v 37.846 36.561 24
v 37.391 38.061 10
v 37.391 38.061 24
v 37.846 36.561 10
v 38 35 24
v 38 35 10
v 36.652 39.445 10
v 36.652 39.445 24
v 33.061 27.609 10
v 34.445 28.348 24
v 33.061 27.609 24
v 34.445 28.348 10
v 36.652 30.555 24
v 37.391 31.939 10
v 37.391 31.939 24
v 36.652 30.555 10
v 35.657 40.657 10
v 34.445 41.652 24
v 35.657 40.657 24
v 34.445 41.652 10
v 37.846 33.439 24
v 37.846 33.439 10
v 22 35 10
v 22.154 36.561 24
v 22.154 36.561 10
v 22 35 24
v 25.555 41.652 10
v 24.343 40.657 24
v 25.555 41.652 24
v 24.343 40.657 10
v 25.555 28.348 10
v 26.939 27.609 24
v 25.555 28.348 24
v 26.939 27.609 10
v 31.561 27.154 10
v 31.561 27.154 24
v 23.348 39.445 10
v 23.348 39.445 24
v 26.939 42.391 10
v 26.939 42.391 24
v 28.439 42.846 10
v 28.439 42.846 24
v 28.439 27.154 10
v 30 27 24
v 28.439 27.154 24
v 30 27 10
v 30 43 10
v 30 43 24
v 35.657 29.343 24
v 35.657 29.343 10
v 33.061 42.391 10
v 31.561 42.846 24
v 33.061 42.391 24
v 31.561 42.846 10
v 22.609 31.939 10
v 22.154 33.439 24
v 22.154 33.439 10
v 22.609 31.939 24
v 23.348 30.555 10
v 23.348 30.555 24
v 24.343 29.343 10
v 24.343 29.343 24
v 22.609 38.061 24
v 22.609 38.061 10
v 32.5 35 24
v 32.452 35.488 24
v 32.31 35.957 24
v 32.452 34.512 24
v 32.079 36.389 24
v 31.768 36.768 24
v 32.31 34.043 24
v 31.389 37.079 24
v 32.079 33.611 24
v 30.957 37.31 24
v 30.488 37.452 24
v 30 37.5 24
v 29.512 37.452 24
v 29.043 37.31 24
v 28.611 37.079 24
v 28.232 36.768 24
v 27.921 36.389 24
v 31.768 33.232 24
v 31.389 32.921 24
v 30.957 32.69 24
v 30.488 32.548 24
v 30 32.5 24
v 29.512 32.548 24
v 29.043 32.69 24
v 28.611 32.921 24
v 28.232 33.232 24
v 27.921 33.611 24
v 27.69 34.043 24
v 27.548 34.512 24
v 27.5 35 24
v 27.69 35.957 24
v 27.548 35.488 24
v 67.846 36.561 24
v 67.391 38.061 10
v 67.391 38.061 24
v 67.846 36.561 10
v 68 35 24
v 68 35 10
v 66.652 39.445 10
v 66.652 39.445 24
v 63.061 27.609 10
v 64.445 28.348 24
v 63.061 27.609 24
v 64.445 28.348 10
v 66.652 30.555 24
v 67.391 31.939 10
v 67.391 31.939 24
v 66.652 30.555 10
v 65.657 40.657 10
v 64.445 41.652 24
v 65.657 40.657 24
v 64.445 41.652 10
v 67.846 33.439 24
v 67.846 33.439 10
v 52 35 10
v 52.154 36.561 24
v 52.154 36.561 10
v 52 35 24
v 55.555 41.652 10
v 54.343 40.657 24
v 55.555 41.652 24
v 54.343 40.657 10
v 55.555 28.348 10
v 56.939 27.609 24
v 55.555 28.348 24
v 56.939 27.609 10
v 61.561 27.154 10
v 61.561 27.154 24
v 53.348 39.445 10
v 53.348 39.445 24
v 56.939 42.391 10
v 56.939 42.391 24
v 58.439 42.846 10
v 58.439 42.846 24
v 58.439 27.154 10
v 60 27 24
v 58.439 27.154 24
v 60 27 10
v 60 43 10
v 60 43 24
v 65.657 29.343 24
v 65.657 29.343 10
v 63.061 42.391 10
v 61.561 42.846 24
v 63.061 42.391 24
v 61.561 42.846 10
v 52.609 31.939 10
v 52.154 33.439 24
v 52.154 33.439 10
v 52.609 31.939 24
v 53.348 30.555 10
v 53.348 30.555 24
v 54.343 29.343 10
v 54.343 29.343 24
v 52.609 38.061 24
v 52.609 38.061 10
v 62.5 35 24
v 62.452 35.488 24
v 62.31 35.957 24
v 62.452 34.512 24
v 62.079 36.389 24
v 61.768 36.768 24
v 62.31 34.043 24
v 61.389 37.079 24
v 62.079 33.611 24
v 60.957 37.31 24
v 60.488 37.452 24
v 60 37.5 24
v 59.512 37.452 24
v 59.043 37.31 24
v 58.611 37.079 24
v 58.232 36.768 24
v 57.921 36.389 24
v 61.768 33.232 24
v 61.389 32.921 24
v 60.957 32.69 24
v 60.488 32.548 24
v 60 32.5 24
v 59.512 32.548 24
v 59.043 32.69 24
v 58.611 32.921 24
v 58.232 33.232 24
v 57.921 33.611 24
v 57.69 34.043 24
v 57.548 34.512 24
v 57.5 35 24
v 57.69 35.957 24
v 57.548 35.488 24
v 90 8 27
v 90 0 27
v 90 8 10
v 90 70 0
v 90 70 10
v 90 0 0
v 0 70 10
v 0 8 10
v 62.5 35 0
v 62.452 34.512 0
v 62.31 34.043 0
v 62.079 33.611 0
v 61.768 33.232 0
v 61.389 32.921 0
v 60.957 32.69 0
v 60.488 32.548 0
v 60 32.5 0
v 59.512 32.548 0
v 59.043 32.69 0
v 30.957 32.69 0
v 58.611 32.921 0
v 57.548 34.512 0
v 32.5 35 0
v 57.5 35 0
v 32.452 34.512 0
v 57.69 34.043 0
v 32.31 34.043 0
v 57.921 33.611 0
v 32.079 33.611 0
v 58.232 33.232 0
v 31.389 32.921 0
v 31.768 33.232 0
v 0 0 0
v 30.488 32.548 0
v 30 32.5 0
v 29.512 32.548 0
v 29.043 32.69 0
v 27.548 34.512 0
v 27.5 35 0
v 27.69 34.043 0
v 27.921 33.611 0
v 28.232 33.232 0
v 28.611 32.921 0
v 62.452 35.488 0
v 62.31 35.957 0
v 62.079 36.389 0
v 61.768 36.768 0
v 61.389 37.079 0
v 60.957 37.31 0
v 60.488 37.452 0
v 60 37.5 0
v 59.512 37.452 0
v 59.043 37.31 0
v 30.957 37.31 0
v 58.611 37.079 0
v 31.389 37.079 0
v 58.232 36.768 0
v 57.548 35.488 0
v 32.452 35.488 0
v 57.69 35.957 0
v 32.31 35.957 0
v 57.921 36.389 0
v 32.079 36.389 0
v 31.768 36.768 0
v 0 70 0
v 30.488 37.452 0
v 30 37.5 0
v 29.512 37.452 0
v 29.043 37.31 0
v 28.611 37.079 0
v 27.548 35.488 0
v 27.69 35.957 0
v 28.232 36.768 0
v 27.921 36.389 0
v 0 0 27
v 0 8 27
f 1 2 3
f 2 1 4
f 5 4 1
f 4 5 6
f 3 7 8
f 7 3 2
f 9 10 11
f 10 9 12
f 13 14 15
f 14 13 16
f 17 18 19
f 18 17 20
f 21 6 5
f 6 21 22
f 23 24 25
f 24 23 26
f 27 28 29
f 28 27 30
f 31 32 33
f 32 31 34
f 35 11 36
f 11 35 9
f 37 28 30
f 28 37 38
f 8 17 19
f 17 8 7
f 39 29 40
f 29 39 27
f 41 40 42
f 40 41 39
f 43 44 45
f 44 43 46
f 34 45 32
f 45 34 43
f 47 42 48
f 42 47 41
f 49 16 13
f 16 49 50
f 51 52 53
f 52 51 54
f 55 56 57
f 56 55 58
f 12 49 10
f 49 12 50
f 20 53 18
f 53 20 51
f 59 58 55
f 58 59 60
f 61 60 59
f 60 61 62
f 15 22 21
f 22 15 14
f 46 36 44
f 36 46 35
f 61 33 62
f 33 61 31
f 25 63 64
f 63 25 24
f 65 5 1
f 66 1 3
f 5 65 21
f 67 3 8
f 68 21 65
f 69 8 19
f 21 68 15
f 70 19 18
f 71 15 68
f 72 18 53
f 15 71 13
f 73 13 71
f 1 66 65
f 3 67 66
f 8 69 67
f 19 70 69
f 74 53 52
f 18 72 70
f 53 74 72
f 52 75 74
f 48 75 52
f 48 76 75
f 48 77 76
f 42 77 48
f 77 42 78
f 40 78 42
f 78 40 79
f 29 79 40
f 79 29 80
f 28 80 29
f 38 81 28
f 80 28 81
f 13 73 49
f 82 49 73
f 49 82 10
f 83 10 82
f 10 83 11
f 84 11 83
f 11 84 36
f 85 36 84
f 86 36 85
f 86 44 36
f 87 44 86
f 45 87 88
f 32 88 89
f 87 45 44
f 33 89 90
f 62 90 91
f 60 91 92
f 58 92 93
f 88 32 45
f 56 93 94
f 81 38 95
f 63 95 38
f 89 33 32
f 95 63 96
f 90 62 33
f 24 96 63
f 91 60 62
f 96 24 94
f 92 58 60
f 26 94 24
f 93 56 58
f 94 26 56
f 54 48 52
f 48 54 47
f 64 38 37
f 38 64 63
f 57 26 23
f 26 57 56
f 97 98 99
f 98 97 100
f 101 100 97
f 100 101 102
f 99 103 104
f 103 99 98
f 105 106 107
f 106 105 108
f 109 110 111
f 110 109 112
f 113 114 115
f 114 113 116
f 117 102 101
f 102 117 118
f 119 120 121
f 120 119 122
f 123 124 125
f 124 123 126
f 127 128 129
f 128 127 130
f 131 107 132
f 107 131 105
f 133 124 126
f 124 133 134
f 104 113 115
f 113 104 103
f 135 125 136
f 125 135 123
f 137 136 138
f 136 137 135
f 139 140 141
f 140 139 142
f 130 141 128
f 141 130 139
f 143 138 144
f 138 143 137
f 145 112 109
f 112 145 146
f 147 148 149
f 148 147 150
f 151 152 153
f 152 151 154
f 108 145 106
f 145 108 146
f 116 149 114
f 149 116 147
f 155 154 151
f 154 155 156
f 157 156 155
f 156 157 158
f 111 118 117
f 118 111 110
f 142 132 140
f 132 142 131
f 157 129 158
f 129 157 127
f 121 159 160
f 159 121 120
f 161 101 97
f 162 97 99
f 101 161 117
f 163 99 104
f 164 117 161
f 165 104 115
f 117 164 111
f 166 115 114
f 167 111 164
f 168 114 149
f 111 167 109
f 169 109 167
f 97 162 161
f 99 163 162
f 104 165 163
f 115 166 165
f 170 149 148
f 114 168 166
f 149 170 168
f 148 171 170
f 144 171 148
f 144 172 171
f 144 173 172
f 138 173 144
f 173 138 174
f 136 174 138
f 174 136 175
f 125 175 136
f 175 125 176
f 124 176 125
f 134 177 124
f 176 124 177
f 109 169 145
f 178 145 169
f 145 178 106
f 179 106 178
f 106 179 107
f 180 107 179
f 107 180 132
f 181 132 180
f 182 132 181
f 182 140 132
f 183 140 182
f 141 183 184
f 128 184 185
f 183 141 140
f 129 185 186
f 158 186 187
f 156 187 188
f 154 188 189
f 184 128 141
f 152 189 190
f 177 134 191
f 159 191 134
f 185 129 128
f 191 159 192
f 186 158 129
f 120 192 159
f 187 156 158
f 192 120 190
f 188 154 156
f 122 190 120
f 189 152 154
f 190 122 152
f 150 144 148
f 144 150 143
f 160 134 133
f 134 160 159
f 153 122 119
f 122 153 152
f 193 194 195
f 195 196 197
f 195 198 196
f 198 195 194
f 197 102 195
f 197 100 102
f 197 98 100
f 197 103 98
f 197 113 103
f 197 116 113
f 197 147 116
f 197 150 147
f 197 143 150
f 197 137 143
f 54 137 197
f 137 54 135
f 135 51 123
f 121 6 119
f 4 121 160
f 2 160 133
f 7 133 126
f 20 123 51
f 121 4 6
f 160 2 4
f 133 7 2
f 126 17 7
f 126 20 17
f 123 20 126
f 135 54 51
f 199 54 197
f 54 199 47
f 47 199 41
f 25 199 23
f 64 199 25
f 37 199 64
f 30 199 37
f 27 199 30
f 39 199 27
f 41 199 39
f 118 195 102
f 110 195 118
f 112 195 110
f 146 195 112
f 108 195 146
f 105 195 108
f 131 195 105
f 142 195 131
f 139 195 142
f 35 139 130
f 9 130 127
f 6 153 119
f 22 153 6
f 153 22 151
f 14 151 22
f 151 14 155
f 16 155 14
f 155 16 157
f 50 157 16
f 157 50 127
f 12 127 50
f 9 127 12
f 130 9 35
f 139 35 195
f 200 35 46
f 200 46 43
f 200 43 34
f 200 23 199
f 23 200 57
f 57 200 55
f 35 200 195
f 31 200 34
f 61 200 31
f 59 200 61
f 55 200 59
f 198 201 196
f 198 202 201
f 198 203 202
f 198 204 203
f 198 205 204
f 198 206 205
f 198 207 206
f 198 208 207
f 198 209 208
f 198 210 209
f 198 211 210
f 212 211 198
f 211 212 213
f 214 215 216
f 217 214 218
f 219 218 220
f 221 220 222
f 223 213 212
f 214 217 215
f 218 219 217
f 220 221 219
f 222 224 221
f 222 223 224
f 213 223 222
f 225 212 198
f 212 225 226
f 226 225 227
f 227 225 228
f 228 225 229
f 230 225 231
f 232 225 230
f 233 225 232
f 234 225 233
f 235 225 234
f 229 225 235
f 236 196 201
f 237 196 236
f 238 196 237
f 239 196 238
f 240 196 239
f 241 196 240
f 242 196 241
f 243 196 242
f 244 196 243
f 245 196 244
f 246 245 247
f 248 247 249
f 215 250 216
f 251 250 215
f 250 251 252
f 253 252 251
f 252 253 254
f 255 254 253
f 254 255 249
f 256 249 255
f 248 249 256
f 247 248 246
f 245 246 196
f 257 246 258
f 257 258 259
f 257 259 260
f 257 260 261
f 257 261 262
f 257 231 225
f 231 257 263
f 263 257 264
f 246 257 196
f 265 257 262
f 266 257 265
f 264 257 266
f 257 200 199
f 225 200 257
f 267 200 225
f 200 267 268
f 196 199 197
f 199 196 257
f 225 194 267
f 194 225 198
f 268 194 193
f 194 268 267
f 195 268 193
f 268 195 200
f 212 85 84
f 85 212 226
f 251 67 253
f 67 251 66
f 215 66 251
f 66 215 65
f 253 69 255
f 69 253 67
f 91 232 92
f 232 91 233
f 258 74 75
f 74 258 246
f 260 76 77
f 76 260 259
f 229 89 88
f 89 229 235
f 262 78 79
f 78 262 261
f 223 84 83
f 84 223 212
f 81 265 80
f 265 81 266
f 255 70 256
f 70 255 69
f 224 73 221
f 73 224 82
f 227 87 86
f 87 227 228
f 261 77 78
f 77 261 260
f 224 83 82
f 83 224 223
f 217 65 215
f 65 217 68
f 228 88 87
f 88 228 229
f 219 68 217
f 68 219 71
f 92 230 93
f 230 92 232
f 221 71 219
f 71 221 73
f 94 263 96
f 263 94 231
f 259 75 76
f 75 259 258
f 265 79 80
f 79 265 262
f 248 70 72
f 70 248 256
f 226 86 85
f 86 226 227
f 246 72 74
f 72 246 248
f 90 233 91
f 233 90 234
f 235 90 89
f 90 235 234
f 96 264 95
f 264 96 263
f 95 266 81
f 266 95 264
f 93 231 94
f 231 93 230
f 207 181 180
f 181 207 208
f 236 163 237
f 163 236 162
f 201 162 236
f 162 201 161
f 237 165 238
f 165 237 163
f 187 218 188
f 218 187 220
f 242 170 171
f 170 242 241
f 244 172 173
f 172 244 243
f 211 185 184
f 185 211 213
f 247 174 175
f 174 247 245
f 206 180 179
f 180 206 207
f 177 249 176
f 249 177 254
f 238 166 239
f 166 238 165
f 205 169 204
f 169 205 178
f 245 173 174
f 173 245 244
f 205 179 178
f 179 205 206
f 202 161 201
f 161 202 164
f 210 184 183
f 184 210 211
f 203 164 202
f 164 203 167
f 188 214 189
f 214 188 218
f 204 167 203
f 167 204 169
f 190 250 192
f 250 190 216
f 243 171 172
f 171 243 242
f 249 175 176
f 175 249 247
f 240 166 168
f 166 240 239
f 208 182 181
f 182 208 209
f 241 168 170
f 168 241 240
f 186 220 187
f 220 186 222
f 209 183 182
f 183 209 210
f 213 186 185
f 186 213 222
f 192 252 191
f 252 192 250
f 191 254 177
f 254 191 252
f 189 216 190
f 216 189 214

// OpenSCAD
$fn = 32;

// ----------------------------------------------------------------------
// Drill jig: fence jig
// ----------------------------------------------------------------------

// --- parameters (mm) ---
plate_l = 90;             // plate length, X
plate_w = 70;             // plate width, Y
plate_t = 10;             // plate thickness
boss_d = 16;              // guide boss diameter
boss_h = 15;              // boss height above the plate
guide_d = 5;              // guide hole diameter
boss_pitch = 30;          // boss pitch
fence_h = 18;             // fence height above the plate
fence_t = 8;              // fence thickness

n_boss = 2;  // guide bosses
boss_x0 = (plate_l - (n_boss - 1) * boss_pitch) / 2;  // first boss X
boss_top = plate_t - 1 + boss_h;  // boss crown height
fence_top = plate_t - 1 + fence_h;  // fence crown height
total_h = max([fence_top, boss_top]);  // overall height

difference() {
  union() {
  cube([plate_l, plate_w, plate_t]);
  for (i = [0 : n_boss - 1])
    translate([boss_x0 + i * boss_pitch, plate_w / 2, plate_t - 1])
      cylinder(h = boss_h, d = boss_d);
  translate([0, 0, plate_t - 1]) cube([plate_l, fence_t, fence_h]);
  }
  for (i = [0 : n_boss - 1])
    translate([boss_x0 + i * boss_pitch, plate_w / 2, -1])
      cylinder(h = plate_t + boss_h, d = guide_d);
}
